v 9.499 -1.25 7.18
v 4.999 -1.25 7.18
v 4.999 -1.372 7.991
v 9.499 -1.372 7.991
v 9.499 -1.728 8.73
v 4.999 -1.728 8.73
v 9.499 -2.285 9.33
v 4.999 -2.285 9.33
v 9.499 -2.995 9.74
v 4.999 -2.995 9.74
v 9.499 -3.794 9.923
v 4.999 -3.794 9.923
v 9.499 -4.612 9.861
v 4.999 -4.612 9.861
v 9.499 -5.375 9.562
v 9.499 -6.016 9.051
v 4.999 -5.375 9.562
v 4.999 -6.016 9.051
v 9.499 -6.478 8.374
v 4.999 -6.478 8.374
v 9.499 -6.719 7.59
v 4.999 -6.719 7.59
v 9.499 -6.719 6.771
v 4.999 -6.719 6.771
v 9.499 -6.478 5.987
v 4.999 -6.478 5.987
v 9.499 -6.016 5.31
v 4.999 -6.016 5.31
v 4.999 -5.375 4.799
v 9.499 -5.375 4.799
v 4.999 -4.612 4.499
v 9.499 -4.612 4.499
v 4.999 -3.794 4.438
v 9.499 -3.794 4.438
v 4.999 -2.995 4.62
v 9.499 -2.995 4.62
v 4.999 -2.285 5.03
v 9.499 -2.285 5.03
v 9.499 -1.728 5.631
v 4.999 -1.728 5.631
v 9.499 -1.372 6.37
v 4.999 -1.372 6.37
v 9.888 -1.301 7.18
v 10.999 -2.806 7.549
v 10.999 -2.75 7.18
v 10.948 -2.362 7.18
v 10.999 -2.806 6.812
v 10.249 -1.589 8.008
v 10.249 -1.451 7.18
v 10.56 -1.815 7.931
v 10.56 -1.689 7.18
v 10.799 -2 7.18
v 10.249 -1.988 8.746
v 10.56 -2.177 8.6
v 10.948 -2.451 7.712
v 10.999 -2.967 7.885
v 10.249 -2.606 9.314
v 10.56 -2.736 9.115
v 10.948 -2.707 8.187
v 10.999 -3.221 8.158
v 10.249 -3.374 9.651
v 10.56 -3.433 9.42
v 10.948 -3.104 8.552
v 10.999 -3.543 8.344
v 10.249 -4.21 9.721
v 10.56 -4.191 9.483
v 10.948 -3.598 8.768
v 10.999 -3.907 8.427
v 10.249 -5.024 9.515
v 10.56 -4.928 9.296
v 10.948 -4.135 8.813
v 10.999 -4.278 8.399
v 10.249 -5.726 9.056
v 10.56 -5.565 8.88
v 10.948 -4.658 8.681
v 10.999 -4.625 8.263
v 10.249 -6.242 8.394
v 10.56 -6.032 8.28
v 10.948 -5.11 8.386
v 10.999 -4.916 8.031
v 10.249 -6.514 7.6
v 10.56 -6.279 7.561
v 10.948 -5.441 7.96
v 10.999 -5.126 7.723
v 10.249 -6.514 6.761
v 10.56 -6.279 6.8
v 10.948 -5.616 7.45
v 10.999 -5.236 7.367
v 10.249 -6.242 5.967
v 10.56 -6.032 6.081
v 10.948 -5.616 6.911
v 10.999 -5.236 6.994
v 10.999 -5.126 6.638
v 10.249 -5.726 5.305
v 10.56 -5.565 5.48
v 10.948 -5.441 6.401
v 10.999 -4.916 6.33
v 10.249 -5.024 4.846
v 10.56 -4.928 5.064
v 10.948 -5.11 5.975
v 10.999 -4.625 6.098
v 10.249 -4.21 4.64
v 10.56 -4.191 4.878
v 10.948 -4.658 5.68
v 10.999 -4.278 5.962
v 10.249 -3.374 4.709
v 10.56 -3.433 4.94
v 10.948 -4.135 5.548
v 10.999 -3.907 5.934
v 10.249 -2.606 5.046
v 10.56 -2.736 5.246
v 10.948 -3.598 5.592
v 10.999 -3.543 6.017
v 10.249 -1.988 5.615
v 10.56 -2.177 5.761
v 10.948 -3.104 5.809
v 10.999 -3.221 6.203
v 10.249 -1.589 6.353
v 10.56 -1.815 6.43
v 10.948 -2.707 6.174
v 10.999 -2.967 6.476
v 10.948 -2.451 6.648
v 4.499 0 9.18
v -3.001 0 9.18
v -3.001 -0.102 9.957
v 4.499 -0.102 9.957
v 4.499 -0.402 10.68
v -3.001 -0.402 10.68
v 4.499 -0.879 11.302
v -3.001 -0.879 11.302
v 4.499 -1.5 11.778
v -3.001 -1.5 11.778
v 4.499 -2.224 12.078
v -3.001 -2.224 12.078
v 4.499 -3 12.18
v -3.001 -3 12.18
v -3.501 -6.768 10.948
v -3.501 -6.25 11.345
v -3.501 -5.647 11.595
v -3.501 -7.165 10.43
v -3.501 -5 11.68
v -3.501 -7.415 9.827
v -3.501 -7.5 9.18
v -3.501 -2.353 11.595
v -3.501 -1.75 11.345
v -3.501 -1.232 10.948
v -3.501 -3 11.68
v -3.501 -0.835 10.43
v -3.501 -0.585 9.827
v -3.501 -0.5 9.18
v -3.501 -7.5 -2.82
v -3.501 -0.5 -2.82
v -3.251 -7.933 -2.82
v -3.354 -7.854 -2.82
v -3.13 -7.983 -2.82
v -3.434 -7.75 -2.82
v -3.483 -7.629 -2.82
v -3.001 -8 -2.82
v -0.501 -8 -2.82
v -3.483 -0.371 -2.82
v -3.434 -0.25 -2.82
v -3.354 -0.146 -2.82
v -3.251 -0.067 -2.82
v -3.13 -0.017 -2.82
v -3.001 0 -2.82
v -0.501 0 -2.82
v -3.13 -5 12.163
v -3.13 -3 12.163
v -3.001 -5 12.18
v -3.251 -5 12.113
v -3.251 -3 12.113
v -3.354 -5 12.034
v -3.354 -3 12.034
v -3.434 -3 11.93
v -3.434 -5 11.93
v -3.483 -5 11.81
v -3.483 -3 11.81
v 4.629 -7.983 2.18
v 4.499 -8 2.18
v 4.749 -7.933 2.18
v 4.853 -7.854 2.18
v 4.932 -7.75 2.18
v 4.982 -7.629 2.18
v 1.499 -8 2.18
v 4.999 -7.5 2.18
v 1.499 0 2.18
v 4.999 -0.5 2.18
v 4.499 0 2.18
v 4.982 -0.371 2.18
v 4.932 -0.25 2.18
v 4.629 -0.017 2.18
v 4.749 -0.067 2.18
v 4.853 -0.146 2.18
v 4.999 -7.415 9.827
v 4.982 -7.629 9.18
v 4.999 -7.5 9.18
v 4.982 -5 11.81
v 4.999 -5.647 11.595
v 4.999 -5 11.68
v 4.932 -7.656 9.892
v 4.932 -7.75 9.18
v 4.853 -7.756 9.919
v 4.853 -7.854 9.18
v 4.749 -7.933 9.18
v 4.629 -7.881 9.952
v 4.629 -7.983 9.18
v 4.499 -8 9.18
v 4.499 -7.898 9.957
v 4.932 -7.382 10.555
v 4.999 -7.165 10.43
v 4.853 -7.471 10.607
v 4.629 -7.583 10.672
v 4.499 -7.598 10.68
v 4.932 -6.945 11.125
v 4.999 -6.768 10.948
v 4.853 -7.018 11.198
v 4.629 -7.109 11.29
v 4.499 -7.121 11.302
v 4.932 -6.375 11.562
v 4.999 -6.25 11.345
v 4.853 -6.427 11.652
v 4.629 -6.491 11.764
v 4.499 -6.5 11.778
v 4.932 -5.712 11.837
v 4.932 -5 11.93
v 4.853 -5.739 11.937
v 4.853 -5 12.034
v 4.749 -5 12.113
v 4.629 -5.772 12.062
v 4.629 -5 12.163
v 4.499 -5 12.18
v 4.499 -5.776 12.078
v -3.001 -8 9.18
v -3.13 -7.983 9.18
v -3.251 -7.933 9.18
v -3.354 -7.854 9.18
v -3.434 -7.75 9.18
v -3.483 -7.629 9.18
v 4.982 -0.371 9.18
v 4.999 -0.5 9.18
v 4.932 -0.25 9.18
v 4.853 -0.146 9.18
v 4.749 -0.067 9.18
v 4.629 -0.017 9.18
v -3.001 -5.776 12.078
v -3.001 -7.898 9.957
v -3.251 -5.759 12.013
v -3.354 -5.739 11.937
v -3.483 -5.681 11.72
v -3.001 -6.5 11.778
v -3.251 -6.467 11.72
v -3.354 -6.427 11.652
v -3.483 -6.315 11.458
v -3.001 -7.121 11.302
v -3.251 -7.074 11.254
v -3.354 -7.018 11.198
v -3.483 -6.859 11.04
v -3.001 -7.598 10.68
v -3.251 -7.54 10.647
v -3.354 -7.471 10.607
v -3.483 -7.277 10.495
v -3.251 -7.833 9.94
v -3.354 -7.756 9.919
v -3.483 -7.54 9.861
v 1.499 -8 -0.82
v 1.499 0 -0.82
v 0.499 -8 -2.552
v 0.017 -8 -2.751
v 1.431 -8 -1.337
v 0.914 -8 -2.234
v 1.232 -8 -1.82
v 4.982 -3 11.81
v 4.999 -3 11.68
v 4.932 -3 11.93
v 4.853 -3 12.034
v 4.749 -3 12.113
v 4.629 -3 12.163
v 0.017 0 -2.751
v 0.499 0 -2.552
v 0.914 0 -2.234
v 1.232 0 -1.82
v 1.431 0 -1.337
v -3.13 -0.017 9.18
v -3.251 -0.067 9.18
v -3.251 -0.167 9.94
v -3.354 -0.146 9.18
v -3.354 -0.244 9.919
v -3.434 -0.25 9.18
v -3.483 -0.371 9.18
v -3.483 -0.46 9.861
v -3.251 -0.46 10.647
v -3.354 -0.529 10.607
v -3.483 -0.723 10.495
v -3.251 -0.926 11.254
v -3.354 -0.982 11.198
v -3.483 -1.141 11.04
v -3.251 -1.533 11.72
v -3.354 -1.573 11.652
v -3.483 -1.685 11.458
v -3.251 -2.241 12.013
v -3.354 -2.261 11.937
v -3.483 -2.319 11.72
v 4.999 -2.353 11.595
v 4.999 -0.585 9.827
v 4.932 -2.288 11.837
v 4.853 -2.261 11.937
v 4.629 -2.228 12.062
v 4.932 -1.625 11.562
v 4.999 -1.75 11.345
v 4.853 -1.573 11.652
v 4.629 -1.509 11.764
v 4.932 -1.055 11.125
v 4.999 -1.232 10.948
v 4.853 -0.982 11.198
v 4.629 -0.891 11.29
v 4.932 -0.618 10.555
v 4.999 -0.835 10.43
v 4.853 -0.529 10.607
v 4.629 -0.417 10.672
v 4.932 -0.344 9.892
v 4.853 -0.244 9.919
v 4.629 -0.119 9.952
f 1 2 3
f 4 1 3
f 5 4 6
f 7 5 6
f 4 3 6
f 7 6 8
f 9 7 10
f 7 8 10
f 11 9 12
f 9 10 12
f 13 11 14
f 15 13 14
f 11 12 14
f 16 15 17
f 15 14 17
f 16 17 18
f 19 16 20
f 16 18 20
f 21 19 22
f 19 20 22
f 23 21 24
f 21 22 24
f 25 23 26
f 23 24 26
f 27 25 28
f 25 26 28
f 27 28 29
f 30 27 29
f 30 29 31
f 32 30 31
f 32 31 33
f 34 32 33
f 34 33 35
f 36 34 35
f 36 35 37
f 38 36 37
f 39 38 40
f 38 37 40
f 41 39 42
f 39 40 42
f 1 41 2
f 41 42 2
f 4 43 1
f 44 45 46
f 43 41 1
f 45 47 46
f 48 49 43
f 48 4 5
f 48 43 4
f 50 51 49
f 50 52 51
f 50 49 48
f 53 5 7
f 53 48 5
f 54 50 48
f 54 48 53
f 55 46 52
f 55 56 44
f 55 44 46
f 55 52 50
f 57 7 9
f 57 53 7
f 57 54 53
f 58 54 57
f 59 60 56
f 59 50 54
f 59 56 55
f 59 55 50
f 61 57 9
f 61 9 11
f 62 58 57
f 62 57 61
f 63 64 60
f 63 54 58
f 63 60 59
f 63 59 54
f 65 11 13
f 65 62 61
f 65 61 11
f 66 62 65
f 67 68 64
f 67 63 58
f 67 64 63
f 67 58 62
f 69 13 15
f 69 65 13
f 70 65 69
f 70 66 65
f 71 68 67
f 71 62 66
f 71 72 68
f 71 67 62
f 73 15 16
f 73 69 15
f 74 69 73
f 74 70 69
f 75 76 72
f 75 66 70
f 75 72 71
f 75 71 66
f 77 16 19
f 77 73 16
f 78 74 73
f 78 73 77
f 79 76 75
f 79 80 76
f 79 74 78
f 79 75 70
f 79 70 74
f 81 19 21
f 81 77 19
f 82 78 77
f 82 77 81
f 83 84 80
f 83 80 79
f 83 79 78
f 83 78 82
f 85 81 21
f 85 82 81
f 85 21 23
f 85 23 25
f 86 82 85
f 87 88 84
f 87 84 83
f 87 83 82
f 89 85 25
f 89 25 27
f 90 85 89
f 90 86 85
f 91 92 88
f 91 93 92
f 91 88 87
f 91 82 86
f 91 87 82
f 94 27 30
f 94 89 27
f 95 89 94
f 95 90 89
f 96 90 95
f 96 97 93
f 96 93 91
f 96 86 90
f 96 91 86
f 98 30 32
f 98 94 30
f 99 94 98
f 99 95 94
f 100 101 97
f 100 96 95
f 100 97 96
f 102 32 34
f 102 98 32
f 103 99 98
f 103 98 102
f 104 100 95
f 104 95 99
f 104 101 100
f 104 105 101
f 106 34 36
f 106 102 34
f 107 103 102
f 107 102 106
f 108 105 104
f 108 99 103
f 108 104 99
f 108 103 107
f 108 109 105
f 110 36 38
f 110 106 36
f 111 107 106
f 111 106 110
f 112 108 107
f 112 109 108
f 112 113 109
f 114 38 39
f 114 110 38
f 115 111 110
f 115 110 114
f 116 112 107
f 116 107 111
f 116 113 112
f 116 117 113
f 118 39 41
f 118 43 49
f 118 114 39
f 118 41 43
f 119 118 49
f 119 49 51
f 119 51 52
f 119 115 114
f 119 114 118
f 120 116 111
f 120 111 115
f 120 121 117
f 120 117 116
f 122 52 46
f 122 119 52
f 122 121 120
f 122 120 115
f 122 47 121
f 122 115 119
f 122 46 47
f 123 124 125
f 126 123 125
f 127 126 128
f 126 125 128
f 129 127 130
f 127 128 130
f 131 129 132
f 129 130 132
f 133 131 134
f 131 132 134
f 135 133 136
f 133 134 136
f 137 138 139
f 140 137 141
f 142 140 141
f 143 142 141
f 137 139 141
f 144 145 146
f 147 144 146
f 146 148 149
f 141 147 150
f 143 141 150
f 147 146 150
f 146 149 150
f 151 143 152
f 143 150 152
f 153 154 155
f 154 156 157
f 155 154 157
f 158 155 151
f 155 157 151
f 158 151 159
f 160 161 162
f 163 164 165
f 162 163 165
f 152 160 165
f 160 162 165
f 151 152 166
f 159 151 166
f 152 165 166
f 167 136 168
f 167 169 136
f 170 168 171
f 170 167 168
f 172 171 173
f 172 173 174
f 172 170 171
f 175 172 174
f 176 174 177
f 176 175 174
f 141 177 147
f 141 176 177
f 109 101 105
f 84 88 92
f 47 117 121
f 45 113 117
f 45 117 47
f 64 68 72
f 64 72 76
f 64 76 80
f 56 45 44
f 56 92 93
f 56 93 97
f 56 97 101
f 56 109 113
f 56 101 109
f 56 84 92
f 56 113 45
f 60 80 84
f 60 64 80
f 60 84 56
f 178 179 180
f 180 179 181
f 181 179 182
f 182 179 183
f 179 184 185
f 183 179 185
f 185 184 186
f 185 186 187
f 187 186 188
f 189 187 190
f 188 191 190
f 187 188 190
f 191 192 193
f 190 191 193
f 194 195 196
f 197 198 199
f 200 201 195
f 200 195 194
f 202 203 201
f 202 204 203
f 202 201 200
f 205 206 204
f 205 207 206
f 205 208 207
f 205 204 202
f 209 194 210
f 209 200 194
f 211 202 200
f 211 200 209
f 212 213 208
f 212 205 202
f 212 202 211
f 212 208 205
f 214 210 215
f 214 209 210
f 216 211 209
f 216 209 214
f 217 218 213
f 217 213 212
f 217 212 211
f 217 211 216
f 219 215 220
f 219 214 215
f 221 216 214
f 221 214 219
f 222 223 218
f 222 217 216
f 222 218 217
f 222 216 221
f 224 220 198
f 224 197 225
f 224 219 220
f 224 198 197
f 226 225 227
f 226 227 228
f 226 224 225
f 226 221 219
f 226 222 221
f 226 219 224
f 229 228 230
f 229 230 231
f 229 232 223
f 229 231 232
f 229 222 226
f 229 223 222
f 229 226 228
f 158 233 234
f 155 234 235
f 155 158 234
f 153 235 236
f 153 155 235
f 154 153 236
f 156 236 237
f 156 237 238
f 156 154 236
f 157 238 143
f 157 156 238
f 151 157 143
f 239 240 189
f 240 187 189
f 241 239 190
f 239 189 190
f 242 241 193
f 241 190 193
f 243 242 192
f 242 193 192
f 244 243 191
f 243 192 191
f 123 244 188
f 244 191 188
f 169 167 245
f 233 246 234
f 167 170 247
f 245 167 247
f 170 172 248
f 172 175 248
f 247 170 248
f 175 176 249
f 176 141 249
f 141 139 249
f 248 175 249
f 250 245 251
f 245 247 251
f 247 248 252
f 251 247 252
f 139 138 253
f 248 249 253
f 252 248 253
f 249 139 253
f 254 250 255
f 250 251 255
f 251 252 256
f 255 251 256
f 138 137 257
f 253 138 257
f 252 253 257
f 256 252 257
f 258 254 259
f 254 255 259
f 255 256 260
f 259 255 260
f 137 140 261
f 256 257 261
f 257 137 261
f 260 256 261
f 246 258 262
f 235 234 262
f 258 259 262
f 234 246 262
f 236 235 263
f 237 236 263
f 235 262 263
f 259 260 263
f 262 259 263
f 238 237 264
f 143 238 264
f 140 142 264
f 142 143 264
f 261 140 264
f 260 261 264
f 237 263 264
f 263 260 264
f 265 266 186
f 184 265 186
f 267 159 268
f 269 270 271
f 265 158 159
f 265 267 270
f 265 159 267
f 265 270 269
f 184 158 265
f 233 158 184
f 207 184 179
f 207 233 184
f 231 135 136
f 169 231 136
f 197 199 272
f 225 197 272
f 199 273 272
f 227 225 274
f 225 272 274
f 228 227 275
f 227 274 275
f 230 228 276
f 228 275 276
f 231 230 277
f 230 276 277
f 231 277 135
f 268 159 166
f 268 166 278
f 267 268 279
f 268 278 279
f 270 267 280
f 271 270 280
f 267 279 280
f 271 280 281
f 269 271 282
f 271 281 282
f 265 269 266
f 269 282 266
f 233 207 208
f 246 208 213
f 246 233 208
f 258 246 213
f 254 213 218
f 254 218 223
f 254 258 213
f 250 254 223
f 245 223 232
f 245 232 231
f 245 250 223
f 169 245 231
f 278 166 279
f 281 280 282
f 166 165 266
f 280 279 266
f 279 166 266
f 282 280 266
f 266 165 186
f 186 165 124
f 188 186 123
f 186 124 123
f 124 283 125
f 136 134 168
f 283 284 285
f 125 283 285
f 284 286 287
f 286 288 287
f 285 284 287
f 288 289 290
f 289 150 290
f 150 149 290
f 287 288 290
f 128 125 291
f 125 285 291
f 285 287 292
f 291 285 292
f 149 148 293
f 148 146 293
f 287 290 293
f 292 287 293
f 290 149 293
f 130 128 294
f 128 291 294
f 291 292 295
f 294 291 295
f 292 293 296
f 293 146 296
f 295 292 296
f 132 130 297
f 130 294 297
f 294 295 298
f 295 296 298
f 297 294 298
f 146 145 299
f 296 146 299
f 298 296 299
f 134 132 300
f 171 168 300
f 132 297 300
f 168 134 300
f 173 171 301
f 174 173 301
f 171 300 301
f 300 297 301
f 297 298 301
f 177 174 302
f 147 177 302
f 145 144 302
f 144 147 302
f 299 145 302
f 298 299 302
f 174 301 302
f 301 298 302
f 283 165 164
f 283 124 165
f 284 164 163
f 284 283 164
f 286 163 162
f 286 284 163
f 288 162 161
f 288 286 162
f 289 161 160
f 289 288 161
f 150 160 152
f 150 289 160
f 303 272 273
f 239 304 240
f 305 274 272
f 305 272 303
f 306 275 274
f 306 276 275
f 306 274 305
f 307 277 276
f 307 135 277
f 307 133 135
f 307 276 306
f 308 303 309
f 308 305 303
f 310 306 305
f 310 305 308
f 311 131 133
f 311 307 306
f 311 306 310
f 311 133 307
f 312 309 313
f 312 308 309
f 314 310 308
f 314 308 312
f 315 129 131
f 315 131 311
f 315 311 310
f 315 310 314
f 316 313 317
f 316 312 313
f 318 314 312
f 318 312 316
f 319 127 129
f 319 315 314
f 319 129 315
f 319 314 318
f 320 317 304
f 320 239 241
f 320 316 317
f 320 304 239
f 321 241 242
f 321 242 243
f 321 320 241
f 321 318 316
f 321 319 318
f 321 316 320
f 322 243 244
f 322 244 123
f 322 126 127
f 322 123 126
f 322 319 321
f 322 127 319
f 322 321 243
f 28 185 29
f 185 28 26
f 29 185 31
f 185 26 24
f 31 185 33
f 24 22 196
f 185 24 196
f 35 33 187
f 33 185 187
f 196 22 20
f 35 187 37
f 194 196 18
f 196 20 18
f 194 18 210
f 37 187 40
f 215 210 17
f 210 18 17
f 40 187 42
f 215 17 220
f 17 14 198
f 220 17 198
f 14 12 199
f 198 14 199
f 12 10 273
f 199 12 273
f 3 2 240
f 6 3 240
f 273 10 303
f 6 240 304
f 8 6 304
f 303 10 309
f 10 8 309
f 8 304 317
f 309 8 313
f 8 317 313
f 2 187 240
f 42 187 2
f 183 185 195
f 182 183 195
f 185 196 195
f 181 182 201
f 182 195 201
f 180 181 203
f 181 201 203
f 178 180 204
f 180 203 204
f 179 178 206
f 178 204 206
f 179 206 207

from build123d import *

# Parameters (mm, degrees)
F1_DEPTH = 8
F2_R     = 2.75
F3_DEPTH = 6
F4_R     = 1.5
F5_R     = 3
F6_R     = 0.5


with BuildPart() as f1:
    # F0 (on Front) → F1 (new body)
    with BuildSketch(Plane.XZ):
        with BuildLine():
            Line((4.9994771853, 12.180397345), (-3.5005228147, 12.180397345))
            Line((-3.5005228147, 12.180397345), (-3.5005228147, -2.819602655))
            Line((-3.5005228147, -2.819602655), (-0.5005228147, -2.819602655))
            ThreePointArc((-0.5005228147, -2.819602655), (0.9136907477, -2.2338162174), (1.4994771853, -0.819602655))
            Line((1.4994771853, -0.819602655), (1.4994771853, 2.180397345))
            Line((1.4994771853, 2.180397345), (4.9994771853, 2.180397345))
            Line((4.9994771853, 2.180397345), (4.9994771853, 12.180397345))
        make_face()
    extrude(amount=F1_DEPTH)

    # F2 (on face) → F3 (join)
    with BuildSketch(Plane.YZ.offset(4.9994771853)):
        with Locations((-4, 7.180397345)):
            Circle(F2_R)
    extrude(amount=F3_DEPTH)

    # F4
    f4_edges = [f1.edges().sort_by_distance(p)[0] for p in [
        (10.999477, -6.75, 7.180397),
    ]]
    fillet(f4_edges, radius=F4_R)

    # F5
    f5_edges = [f1.edges().sort_by_distance(p)[0] for p in [
        (0.749477, 0, 12.180397),
        (0.749477, -8, 12.180397),
    ]]
    fillet(f5_edges, radius=F5_R)

    # F6
    f6_edges = [f1.edges().sort_by_distance(p)[0] for p in [
        (4.999477, -8, 5.680397),
        (4.999477, -7.12132, 11.301718),
        (4.999477, -4, 12.180397),
        (4.999477, -0.87868, 11.301718),
        (4.999477, 0, 5.680397),
        (-3.500523, -8, 3.180397),
        (-3.500523, -7.12132, 11.301718),
    ]]
    fillet(f6_edges, radius=F6_R)


solid = f1.part
